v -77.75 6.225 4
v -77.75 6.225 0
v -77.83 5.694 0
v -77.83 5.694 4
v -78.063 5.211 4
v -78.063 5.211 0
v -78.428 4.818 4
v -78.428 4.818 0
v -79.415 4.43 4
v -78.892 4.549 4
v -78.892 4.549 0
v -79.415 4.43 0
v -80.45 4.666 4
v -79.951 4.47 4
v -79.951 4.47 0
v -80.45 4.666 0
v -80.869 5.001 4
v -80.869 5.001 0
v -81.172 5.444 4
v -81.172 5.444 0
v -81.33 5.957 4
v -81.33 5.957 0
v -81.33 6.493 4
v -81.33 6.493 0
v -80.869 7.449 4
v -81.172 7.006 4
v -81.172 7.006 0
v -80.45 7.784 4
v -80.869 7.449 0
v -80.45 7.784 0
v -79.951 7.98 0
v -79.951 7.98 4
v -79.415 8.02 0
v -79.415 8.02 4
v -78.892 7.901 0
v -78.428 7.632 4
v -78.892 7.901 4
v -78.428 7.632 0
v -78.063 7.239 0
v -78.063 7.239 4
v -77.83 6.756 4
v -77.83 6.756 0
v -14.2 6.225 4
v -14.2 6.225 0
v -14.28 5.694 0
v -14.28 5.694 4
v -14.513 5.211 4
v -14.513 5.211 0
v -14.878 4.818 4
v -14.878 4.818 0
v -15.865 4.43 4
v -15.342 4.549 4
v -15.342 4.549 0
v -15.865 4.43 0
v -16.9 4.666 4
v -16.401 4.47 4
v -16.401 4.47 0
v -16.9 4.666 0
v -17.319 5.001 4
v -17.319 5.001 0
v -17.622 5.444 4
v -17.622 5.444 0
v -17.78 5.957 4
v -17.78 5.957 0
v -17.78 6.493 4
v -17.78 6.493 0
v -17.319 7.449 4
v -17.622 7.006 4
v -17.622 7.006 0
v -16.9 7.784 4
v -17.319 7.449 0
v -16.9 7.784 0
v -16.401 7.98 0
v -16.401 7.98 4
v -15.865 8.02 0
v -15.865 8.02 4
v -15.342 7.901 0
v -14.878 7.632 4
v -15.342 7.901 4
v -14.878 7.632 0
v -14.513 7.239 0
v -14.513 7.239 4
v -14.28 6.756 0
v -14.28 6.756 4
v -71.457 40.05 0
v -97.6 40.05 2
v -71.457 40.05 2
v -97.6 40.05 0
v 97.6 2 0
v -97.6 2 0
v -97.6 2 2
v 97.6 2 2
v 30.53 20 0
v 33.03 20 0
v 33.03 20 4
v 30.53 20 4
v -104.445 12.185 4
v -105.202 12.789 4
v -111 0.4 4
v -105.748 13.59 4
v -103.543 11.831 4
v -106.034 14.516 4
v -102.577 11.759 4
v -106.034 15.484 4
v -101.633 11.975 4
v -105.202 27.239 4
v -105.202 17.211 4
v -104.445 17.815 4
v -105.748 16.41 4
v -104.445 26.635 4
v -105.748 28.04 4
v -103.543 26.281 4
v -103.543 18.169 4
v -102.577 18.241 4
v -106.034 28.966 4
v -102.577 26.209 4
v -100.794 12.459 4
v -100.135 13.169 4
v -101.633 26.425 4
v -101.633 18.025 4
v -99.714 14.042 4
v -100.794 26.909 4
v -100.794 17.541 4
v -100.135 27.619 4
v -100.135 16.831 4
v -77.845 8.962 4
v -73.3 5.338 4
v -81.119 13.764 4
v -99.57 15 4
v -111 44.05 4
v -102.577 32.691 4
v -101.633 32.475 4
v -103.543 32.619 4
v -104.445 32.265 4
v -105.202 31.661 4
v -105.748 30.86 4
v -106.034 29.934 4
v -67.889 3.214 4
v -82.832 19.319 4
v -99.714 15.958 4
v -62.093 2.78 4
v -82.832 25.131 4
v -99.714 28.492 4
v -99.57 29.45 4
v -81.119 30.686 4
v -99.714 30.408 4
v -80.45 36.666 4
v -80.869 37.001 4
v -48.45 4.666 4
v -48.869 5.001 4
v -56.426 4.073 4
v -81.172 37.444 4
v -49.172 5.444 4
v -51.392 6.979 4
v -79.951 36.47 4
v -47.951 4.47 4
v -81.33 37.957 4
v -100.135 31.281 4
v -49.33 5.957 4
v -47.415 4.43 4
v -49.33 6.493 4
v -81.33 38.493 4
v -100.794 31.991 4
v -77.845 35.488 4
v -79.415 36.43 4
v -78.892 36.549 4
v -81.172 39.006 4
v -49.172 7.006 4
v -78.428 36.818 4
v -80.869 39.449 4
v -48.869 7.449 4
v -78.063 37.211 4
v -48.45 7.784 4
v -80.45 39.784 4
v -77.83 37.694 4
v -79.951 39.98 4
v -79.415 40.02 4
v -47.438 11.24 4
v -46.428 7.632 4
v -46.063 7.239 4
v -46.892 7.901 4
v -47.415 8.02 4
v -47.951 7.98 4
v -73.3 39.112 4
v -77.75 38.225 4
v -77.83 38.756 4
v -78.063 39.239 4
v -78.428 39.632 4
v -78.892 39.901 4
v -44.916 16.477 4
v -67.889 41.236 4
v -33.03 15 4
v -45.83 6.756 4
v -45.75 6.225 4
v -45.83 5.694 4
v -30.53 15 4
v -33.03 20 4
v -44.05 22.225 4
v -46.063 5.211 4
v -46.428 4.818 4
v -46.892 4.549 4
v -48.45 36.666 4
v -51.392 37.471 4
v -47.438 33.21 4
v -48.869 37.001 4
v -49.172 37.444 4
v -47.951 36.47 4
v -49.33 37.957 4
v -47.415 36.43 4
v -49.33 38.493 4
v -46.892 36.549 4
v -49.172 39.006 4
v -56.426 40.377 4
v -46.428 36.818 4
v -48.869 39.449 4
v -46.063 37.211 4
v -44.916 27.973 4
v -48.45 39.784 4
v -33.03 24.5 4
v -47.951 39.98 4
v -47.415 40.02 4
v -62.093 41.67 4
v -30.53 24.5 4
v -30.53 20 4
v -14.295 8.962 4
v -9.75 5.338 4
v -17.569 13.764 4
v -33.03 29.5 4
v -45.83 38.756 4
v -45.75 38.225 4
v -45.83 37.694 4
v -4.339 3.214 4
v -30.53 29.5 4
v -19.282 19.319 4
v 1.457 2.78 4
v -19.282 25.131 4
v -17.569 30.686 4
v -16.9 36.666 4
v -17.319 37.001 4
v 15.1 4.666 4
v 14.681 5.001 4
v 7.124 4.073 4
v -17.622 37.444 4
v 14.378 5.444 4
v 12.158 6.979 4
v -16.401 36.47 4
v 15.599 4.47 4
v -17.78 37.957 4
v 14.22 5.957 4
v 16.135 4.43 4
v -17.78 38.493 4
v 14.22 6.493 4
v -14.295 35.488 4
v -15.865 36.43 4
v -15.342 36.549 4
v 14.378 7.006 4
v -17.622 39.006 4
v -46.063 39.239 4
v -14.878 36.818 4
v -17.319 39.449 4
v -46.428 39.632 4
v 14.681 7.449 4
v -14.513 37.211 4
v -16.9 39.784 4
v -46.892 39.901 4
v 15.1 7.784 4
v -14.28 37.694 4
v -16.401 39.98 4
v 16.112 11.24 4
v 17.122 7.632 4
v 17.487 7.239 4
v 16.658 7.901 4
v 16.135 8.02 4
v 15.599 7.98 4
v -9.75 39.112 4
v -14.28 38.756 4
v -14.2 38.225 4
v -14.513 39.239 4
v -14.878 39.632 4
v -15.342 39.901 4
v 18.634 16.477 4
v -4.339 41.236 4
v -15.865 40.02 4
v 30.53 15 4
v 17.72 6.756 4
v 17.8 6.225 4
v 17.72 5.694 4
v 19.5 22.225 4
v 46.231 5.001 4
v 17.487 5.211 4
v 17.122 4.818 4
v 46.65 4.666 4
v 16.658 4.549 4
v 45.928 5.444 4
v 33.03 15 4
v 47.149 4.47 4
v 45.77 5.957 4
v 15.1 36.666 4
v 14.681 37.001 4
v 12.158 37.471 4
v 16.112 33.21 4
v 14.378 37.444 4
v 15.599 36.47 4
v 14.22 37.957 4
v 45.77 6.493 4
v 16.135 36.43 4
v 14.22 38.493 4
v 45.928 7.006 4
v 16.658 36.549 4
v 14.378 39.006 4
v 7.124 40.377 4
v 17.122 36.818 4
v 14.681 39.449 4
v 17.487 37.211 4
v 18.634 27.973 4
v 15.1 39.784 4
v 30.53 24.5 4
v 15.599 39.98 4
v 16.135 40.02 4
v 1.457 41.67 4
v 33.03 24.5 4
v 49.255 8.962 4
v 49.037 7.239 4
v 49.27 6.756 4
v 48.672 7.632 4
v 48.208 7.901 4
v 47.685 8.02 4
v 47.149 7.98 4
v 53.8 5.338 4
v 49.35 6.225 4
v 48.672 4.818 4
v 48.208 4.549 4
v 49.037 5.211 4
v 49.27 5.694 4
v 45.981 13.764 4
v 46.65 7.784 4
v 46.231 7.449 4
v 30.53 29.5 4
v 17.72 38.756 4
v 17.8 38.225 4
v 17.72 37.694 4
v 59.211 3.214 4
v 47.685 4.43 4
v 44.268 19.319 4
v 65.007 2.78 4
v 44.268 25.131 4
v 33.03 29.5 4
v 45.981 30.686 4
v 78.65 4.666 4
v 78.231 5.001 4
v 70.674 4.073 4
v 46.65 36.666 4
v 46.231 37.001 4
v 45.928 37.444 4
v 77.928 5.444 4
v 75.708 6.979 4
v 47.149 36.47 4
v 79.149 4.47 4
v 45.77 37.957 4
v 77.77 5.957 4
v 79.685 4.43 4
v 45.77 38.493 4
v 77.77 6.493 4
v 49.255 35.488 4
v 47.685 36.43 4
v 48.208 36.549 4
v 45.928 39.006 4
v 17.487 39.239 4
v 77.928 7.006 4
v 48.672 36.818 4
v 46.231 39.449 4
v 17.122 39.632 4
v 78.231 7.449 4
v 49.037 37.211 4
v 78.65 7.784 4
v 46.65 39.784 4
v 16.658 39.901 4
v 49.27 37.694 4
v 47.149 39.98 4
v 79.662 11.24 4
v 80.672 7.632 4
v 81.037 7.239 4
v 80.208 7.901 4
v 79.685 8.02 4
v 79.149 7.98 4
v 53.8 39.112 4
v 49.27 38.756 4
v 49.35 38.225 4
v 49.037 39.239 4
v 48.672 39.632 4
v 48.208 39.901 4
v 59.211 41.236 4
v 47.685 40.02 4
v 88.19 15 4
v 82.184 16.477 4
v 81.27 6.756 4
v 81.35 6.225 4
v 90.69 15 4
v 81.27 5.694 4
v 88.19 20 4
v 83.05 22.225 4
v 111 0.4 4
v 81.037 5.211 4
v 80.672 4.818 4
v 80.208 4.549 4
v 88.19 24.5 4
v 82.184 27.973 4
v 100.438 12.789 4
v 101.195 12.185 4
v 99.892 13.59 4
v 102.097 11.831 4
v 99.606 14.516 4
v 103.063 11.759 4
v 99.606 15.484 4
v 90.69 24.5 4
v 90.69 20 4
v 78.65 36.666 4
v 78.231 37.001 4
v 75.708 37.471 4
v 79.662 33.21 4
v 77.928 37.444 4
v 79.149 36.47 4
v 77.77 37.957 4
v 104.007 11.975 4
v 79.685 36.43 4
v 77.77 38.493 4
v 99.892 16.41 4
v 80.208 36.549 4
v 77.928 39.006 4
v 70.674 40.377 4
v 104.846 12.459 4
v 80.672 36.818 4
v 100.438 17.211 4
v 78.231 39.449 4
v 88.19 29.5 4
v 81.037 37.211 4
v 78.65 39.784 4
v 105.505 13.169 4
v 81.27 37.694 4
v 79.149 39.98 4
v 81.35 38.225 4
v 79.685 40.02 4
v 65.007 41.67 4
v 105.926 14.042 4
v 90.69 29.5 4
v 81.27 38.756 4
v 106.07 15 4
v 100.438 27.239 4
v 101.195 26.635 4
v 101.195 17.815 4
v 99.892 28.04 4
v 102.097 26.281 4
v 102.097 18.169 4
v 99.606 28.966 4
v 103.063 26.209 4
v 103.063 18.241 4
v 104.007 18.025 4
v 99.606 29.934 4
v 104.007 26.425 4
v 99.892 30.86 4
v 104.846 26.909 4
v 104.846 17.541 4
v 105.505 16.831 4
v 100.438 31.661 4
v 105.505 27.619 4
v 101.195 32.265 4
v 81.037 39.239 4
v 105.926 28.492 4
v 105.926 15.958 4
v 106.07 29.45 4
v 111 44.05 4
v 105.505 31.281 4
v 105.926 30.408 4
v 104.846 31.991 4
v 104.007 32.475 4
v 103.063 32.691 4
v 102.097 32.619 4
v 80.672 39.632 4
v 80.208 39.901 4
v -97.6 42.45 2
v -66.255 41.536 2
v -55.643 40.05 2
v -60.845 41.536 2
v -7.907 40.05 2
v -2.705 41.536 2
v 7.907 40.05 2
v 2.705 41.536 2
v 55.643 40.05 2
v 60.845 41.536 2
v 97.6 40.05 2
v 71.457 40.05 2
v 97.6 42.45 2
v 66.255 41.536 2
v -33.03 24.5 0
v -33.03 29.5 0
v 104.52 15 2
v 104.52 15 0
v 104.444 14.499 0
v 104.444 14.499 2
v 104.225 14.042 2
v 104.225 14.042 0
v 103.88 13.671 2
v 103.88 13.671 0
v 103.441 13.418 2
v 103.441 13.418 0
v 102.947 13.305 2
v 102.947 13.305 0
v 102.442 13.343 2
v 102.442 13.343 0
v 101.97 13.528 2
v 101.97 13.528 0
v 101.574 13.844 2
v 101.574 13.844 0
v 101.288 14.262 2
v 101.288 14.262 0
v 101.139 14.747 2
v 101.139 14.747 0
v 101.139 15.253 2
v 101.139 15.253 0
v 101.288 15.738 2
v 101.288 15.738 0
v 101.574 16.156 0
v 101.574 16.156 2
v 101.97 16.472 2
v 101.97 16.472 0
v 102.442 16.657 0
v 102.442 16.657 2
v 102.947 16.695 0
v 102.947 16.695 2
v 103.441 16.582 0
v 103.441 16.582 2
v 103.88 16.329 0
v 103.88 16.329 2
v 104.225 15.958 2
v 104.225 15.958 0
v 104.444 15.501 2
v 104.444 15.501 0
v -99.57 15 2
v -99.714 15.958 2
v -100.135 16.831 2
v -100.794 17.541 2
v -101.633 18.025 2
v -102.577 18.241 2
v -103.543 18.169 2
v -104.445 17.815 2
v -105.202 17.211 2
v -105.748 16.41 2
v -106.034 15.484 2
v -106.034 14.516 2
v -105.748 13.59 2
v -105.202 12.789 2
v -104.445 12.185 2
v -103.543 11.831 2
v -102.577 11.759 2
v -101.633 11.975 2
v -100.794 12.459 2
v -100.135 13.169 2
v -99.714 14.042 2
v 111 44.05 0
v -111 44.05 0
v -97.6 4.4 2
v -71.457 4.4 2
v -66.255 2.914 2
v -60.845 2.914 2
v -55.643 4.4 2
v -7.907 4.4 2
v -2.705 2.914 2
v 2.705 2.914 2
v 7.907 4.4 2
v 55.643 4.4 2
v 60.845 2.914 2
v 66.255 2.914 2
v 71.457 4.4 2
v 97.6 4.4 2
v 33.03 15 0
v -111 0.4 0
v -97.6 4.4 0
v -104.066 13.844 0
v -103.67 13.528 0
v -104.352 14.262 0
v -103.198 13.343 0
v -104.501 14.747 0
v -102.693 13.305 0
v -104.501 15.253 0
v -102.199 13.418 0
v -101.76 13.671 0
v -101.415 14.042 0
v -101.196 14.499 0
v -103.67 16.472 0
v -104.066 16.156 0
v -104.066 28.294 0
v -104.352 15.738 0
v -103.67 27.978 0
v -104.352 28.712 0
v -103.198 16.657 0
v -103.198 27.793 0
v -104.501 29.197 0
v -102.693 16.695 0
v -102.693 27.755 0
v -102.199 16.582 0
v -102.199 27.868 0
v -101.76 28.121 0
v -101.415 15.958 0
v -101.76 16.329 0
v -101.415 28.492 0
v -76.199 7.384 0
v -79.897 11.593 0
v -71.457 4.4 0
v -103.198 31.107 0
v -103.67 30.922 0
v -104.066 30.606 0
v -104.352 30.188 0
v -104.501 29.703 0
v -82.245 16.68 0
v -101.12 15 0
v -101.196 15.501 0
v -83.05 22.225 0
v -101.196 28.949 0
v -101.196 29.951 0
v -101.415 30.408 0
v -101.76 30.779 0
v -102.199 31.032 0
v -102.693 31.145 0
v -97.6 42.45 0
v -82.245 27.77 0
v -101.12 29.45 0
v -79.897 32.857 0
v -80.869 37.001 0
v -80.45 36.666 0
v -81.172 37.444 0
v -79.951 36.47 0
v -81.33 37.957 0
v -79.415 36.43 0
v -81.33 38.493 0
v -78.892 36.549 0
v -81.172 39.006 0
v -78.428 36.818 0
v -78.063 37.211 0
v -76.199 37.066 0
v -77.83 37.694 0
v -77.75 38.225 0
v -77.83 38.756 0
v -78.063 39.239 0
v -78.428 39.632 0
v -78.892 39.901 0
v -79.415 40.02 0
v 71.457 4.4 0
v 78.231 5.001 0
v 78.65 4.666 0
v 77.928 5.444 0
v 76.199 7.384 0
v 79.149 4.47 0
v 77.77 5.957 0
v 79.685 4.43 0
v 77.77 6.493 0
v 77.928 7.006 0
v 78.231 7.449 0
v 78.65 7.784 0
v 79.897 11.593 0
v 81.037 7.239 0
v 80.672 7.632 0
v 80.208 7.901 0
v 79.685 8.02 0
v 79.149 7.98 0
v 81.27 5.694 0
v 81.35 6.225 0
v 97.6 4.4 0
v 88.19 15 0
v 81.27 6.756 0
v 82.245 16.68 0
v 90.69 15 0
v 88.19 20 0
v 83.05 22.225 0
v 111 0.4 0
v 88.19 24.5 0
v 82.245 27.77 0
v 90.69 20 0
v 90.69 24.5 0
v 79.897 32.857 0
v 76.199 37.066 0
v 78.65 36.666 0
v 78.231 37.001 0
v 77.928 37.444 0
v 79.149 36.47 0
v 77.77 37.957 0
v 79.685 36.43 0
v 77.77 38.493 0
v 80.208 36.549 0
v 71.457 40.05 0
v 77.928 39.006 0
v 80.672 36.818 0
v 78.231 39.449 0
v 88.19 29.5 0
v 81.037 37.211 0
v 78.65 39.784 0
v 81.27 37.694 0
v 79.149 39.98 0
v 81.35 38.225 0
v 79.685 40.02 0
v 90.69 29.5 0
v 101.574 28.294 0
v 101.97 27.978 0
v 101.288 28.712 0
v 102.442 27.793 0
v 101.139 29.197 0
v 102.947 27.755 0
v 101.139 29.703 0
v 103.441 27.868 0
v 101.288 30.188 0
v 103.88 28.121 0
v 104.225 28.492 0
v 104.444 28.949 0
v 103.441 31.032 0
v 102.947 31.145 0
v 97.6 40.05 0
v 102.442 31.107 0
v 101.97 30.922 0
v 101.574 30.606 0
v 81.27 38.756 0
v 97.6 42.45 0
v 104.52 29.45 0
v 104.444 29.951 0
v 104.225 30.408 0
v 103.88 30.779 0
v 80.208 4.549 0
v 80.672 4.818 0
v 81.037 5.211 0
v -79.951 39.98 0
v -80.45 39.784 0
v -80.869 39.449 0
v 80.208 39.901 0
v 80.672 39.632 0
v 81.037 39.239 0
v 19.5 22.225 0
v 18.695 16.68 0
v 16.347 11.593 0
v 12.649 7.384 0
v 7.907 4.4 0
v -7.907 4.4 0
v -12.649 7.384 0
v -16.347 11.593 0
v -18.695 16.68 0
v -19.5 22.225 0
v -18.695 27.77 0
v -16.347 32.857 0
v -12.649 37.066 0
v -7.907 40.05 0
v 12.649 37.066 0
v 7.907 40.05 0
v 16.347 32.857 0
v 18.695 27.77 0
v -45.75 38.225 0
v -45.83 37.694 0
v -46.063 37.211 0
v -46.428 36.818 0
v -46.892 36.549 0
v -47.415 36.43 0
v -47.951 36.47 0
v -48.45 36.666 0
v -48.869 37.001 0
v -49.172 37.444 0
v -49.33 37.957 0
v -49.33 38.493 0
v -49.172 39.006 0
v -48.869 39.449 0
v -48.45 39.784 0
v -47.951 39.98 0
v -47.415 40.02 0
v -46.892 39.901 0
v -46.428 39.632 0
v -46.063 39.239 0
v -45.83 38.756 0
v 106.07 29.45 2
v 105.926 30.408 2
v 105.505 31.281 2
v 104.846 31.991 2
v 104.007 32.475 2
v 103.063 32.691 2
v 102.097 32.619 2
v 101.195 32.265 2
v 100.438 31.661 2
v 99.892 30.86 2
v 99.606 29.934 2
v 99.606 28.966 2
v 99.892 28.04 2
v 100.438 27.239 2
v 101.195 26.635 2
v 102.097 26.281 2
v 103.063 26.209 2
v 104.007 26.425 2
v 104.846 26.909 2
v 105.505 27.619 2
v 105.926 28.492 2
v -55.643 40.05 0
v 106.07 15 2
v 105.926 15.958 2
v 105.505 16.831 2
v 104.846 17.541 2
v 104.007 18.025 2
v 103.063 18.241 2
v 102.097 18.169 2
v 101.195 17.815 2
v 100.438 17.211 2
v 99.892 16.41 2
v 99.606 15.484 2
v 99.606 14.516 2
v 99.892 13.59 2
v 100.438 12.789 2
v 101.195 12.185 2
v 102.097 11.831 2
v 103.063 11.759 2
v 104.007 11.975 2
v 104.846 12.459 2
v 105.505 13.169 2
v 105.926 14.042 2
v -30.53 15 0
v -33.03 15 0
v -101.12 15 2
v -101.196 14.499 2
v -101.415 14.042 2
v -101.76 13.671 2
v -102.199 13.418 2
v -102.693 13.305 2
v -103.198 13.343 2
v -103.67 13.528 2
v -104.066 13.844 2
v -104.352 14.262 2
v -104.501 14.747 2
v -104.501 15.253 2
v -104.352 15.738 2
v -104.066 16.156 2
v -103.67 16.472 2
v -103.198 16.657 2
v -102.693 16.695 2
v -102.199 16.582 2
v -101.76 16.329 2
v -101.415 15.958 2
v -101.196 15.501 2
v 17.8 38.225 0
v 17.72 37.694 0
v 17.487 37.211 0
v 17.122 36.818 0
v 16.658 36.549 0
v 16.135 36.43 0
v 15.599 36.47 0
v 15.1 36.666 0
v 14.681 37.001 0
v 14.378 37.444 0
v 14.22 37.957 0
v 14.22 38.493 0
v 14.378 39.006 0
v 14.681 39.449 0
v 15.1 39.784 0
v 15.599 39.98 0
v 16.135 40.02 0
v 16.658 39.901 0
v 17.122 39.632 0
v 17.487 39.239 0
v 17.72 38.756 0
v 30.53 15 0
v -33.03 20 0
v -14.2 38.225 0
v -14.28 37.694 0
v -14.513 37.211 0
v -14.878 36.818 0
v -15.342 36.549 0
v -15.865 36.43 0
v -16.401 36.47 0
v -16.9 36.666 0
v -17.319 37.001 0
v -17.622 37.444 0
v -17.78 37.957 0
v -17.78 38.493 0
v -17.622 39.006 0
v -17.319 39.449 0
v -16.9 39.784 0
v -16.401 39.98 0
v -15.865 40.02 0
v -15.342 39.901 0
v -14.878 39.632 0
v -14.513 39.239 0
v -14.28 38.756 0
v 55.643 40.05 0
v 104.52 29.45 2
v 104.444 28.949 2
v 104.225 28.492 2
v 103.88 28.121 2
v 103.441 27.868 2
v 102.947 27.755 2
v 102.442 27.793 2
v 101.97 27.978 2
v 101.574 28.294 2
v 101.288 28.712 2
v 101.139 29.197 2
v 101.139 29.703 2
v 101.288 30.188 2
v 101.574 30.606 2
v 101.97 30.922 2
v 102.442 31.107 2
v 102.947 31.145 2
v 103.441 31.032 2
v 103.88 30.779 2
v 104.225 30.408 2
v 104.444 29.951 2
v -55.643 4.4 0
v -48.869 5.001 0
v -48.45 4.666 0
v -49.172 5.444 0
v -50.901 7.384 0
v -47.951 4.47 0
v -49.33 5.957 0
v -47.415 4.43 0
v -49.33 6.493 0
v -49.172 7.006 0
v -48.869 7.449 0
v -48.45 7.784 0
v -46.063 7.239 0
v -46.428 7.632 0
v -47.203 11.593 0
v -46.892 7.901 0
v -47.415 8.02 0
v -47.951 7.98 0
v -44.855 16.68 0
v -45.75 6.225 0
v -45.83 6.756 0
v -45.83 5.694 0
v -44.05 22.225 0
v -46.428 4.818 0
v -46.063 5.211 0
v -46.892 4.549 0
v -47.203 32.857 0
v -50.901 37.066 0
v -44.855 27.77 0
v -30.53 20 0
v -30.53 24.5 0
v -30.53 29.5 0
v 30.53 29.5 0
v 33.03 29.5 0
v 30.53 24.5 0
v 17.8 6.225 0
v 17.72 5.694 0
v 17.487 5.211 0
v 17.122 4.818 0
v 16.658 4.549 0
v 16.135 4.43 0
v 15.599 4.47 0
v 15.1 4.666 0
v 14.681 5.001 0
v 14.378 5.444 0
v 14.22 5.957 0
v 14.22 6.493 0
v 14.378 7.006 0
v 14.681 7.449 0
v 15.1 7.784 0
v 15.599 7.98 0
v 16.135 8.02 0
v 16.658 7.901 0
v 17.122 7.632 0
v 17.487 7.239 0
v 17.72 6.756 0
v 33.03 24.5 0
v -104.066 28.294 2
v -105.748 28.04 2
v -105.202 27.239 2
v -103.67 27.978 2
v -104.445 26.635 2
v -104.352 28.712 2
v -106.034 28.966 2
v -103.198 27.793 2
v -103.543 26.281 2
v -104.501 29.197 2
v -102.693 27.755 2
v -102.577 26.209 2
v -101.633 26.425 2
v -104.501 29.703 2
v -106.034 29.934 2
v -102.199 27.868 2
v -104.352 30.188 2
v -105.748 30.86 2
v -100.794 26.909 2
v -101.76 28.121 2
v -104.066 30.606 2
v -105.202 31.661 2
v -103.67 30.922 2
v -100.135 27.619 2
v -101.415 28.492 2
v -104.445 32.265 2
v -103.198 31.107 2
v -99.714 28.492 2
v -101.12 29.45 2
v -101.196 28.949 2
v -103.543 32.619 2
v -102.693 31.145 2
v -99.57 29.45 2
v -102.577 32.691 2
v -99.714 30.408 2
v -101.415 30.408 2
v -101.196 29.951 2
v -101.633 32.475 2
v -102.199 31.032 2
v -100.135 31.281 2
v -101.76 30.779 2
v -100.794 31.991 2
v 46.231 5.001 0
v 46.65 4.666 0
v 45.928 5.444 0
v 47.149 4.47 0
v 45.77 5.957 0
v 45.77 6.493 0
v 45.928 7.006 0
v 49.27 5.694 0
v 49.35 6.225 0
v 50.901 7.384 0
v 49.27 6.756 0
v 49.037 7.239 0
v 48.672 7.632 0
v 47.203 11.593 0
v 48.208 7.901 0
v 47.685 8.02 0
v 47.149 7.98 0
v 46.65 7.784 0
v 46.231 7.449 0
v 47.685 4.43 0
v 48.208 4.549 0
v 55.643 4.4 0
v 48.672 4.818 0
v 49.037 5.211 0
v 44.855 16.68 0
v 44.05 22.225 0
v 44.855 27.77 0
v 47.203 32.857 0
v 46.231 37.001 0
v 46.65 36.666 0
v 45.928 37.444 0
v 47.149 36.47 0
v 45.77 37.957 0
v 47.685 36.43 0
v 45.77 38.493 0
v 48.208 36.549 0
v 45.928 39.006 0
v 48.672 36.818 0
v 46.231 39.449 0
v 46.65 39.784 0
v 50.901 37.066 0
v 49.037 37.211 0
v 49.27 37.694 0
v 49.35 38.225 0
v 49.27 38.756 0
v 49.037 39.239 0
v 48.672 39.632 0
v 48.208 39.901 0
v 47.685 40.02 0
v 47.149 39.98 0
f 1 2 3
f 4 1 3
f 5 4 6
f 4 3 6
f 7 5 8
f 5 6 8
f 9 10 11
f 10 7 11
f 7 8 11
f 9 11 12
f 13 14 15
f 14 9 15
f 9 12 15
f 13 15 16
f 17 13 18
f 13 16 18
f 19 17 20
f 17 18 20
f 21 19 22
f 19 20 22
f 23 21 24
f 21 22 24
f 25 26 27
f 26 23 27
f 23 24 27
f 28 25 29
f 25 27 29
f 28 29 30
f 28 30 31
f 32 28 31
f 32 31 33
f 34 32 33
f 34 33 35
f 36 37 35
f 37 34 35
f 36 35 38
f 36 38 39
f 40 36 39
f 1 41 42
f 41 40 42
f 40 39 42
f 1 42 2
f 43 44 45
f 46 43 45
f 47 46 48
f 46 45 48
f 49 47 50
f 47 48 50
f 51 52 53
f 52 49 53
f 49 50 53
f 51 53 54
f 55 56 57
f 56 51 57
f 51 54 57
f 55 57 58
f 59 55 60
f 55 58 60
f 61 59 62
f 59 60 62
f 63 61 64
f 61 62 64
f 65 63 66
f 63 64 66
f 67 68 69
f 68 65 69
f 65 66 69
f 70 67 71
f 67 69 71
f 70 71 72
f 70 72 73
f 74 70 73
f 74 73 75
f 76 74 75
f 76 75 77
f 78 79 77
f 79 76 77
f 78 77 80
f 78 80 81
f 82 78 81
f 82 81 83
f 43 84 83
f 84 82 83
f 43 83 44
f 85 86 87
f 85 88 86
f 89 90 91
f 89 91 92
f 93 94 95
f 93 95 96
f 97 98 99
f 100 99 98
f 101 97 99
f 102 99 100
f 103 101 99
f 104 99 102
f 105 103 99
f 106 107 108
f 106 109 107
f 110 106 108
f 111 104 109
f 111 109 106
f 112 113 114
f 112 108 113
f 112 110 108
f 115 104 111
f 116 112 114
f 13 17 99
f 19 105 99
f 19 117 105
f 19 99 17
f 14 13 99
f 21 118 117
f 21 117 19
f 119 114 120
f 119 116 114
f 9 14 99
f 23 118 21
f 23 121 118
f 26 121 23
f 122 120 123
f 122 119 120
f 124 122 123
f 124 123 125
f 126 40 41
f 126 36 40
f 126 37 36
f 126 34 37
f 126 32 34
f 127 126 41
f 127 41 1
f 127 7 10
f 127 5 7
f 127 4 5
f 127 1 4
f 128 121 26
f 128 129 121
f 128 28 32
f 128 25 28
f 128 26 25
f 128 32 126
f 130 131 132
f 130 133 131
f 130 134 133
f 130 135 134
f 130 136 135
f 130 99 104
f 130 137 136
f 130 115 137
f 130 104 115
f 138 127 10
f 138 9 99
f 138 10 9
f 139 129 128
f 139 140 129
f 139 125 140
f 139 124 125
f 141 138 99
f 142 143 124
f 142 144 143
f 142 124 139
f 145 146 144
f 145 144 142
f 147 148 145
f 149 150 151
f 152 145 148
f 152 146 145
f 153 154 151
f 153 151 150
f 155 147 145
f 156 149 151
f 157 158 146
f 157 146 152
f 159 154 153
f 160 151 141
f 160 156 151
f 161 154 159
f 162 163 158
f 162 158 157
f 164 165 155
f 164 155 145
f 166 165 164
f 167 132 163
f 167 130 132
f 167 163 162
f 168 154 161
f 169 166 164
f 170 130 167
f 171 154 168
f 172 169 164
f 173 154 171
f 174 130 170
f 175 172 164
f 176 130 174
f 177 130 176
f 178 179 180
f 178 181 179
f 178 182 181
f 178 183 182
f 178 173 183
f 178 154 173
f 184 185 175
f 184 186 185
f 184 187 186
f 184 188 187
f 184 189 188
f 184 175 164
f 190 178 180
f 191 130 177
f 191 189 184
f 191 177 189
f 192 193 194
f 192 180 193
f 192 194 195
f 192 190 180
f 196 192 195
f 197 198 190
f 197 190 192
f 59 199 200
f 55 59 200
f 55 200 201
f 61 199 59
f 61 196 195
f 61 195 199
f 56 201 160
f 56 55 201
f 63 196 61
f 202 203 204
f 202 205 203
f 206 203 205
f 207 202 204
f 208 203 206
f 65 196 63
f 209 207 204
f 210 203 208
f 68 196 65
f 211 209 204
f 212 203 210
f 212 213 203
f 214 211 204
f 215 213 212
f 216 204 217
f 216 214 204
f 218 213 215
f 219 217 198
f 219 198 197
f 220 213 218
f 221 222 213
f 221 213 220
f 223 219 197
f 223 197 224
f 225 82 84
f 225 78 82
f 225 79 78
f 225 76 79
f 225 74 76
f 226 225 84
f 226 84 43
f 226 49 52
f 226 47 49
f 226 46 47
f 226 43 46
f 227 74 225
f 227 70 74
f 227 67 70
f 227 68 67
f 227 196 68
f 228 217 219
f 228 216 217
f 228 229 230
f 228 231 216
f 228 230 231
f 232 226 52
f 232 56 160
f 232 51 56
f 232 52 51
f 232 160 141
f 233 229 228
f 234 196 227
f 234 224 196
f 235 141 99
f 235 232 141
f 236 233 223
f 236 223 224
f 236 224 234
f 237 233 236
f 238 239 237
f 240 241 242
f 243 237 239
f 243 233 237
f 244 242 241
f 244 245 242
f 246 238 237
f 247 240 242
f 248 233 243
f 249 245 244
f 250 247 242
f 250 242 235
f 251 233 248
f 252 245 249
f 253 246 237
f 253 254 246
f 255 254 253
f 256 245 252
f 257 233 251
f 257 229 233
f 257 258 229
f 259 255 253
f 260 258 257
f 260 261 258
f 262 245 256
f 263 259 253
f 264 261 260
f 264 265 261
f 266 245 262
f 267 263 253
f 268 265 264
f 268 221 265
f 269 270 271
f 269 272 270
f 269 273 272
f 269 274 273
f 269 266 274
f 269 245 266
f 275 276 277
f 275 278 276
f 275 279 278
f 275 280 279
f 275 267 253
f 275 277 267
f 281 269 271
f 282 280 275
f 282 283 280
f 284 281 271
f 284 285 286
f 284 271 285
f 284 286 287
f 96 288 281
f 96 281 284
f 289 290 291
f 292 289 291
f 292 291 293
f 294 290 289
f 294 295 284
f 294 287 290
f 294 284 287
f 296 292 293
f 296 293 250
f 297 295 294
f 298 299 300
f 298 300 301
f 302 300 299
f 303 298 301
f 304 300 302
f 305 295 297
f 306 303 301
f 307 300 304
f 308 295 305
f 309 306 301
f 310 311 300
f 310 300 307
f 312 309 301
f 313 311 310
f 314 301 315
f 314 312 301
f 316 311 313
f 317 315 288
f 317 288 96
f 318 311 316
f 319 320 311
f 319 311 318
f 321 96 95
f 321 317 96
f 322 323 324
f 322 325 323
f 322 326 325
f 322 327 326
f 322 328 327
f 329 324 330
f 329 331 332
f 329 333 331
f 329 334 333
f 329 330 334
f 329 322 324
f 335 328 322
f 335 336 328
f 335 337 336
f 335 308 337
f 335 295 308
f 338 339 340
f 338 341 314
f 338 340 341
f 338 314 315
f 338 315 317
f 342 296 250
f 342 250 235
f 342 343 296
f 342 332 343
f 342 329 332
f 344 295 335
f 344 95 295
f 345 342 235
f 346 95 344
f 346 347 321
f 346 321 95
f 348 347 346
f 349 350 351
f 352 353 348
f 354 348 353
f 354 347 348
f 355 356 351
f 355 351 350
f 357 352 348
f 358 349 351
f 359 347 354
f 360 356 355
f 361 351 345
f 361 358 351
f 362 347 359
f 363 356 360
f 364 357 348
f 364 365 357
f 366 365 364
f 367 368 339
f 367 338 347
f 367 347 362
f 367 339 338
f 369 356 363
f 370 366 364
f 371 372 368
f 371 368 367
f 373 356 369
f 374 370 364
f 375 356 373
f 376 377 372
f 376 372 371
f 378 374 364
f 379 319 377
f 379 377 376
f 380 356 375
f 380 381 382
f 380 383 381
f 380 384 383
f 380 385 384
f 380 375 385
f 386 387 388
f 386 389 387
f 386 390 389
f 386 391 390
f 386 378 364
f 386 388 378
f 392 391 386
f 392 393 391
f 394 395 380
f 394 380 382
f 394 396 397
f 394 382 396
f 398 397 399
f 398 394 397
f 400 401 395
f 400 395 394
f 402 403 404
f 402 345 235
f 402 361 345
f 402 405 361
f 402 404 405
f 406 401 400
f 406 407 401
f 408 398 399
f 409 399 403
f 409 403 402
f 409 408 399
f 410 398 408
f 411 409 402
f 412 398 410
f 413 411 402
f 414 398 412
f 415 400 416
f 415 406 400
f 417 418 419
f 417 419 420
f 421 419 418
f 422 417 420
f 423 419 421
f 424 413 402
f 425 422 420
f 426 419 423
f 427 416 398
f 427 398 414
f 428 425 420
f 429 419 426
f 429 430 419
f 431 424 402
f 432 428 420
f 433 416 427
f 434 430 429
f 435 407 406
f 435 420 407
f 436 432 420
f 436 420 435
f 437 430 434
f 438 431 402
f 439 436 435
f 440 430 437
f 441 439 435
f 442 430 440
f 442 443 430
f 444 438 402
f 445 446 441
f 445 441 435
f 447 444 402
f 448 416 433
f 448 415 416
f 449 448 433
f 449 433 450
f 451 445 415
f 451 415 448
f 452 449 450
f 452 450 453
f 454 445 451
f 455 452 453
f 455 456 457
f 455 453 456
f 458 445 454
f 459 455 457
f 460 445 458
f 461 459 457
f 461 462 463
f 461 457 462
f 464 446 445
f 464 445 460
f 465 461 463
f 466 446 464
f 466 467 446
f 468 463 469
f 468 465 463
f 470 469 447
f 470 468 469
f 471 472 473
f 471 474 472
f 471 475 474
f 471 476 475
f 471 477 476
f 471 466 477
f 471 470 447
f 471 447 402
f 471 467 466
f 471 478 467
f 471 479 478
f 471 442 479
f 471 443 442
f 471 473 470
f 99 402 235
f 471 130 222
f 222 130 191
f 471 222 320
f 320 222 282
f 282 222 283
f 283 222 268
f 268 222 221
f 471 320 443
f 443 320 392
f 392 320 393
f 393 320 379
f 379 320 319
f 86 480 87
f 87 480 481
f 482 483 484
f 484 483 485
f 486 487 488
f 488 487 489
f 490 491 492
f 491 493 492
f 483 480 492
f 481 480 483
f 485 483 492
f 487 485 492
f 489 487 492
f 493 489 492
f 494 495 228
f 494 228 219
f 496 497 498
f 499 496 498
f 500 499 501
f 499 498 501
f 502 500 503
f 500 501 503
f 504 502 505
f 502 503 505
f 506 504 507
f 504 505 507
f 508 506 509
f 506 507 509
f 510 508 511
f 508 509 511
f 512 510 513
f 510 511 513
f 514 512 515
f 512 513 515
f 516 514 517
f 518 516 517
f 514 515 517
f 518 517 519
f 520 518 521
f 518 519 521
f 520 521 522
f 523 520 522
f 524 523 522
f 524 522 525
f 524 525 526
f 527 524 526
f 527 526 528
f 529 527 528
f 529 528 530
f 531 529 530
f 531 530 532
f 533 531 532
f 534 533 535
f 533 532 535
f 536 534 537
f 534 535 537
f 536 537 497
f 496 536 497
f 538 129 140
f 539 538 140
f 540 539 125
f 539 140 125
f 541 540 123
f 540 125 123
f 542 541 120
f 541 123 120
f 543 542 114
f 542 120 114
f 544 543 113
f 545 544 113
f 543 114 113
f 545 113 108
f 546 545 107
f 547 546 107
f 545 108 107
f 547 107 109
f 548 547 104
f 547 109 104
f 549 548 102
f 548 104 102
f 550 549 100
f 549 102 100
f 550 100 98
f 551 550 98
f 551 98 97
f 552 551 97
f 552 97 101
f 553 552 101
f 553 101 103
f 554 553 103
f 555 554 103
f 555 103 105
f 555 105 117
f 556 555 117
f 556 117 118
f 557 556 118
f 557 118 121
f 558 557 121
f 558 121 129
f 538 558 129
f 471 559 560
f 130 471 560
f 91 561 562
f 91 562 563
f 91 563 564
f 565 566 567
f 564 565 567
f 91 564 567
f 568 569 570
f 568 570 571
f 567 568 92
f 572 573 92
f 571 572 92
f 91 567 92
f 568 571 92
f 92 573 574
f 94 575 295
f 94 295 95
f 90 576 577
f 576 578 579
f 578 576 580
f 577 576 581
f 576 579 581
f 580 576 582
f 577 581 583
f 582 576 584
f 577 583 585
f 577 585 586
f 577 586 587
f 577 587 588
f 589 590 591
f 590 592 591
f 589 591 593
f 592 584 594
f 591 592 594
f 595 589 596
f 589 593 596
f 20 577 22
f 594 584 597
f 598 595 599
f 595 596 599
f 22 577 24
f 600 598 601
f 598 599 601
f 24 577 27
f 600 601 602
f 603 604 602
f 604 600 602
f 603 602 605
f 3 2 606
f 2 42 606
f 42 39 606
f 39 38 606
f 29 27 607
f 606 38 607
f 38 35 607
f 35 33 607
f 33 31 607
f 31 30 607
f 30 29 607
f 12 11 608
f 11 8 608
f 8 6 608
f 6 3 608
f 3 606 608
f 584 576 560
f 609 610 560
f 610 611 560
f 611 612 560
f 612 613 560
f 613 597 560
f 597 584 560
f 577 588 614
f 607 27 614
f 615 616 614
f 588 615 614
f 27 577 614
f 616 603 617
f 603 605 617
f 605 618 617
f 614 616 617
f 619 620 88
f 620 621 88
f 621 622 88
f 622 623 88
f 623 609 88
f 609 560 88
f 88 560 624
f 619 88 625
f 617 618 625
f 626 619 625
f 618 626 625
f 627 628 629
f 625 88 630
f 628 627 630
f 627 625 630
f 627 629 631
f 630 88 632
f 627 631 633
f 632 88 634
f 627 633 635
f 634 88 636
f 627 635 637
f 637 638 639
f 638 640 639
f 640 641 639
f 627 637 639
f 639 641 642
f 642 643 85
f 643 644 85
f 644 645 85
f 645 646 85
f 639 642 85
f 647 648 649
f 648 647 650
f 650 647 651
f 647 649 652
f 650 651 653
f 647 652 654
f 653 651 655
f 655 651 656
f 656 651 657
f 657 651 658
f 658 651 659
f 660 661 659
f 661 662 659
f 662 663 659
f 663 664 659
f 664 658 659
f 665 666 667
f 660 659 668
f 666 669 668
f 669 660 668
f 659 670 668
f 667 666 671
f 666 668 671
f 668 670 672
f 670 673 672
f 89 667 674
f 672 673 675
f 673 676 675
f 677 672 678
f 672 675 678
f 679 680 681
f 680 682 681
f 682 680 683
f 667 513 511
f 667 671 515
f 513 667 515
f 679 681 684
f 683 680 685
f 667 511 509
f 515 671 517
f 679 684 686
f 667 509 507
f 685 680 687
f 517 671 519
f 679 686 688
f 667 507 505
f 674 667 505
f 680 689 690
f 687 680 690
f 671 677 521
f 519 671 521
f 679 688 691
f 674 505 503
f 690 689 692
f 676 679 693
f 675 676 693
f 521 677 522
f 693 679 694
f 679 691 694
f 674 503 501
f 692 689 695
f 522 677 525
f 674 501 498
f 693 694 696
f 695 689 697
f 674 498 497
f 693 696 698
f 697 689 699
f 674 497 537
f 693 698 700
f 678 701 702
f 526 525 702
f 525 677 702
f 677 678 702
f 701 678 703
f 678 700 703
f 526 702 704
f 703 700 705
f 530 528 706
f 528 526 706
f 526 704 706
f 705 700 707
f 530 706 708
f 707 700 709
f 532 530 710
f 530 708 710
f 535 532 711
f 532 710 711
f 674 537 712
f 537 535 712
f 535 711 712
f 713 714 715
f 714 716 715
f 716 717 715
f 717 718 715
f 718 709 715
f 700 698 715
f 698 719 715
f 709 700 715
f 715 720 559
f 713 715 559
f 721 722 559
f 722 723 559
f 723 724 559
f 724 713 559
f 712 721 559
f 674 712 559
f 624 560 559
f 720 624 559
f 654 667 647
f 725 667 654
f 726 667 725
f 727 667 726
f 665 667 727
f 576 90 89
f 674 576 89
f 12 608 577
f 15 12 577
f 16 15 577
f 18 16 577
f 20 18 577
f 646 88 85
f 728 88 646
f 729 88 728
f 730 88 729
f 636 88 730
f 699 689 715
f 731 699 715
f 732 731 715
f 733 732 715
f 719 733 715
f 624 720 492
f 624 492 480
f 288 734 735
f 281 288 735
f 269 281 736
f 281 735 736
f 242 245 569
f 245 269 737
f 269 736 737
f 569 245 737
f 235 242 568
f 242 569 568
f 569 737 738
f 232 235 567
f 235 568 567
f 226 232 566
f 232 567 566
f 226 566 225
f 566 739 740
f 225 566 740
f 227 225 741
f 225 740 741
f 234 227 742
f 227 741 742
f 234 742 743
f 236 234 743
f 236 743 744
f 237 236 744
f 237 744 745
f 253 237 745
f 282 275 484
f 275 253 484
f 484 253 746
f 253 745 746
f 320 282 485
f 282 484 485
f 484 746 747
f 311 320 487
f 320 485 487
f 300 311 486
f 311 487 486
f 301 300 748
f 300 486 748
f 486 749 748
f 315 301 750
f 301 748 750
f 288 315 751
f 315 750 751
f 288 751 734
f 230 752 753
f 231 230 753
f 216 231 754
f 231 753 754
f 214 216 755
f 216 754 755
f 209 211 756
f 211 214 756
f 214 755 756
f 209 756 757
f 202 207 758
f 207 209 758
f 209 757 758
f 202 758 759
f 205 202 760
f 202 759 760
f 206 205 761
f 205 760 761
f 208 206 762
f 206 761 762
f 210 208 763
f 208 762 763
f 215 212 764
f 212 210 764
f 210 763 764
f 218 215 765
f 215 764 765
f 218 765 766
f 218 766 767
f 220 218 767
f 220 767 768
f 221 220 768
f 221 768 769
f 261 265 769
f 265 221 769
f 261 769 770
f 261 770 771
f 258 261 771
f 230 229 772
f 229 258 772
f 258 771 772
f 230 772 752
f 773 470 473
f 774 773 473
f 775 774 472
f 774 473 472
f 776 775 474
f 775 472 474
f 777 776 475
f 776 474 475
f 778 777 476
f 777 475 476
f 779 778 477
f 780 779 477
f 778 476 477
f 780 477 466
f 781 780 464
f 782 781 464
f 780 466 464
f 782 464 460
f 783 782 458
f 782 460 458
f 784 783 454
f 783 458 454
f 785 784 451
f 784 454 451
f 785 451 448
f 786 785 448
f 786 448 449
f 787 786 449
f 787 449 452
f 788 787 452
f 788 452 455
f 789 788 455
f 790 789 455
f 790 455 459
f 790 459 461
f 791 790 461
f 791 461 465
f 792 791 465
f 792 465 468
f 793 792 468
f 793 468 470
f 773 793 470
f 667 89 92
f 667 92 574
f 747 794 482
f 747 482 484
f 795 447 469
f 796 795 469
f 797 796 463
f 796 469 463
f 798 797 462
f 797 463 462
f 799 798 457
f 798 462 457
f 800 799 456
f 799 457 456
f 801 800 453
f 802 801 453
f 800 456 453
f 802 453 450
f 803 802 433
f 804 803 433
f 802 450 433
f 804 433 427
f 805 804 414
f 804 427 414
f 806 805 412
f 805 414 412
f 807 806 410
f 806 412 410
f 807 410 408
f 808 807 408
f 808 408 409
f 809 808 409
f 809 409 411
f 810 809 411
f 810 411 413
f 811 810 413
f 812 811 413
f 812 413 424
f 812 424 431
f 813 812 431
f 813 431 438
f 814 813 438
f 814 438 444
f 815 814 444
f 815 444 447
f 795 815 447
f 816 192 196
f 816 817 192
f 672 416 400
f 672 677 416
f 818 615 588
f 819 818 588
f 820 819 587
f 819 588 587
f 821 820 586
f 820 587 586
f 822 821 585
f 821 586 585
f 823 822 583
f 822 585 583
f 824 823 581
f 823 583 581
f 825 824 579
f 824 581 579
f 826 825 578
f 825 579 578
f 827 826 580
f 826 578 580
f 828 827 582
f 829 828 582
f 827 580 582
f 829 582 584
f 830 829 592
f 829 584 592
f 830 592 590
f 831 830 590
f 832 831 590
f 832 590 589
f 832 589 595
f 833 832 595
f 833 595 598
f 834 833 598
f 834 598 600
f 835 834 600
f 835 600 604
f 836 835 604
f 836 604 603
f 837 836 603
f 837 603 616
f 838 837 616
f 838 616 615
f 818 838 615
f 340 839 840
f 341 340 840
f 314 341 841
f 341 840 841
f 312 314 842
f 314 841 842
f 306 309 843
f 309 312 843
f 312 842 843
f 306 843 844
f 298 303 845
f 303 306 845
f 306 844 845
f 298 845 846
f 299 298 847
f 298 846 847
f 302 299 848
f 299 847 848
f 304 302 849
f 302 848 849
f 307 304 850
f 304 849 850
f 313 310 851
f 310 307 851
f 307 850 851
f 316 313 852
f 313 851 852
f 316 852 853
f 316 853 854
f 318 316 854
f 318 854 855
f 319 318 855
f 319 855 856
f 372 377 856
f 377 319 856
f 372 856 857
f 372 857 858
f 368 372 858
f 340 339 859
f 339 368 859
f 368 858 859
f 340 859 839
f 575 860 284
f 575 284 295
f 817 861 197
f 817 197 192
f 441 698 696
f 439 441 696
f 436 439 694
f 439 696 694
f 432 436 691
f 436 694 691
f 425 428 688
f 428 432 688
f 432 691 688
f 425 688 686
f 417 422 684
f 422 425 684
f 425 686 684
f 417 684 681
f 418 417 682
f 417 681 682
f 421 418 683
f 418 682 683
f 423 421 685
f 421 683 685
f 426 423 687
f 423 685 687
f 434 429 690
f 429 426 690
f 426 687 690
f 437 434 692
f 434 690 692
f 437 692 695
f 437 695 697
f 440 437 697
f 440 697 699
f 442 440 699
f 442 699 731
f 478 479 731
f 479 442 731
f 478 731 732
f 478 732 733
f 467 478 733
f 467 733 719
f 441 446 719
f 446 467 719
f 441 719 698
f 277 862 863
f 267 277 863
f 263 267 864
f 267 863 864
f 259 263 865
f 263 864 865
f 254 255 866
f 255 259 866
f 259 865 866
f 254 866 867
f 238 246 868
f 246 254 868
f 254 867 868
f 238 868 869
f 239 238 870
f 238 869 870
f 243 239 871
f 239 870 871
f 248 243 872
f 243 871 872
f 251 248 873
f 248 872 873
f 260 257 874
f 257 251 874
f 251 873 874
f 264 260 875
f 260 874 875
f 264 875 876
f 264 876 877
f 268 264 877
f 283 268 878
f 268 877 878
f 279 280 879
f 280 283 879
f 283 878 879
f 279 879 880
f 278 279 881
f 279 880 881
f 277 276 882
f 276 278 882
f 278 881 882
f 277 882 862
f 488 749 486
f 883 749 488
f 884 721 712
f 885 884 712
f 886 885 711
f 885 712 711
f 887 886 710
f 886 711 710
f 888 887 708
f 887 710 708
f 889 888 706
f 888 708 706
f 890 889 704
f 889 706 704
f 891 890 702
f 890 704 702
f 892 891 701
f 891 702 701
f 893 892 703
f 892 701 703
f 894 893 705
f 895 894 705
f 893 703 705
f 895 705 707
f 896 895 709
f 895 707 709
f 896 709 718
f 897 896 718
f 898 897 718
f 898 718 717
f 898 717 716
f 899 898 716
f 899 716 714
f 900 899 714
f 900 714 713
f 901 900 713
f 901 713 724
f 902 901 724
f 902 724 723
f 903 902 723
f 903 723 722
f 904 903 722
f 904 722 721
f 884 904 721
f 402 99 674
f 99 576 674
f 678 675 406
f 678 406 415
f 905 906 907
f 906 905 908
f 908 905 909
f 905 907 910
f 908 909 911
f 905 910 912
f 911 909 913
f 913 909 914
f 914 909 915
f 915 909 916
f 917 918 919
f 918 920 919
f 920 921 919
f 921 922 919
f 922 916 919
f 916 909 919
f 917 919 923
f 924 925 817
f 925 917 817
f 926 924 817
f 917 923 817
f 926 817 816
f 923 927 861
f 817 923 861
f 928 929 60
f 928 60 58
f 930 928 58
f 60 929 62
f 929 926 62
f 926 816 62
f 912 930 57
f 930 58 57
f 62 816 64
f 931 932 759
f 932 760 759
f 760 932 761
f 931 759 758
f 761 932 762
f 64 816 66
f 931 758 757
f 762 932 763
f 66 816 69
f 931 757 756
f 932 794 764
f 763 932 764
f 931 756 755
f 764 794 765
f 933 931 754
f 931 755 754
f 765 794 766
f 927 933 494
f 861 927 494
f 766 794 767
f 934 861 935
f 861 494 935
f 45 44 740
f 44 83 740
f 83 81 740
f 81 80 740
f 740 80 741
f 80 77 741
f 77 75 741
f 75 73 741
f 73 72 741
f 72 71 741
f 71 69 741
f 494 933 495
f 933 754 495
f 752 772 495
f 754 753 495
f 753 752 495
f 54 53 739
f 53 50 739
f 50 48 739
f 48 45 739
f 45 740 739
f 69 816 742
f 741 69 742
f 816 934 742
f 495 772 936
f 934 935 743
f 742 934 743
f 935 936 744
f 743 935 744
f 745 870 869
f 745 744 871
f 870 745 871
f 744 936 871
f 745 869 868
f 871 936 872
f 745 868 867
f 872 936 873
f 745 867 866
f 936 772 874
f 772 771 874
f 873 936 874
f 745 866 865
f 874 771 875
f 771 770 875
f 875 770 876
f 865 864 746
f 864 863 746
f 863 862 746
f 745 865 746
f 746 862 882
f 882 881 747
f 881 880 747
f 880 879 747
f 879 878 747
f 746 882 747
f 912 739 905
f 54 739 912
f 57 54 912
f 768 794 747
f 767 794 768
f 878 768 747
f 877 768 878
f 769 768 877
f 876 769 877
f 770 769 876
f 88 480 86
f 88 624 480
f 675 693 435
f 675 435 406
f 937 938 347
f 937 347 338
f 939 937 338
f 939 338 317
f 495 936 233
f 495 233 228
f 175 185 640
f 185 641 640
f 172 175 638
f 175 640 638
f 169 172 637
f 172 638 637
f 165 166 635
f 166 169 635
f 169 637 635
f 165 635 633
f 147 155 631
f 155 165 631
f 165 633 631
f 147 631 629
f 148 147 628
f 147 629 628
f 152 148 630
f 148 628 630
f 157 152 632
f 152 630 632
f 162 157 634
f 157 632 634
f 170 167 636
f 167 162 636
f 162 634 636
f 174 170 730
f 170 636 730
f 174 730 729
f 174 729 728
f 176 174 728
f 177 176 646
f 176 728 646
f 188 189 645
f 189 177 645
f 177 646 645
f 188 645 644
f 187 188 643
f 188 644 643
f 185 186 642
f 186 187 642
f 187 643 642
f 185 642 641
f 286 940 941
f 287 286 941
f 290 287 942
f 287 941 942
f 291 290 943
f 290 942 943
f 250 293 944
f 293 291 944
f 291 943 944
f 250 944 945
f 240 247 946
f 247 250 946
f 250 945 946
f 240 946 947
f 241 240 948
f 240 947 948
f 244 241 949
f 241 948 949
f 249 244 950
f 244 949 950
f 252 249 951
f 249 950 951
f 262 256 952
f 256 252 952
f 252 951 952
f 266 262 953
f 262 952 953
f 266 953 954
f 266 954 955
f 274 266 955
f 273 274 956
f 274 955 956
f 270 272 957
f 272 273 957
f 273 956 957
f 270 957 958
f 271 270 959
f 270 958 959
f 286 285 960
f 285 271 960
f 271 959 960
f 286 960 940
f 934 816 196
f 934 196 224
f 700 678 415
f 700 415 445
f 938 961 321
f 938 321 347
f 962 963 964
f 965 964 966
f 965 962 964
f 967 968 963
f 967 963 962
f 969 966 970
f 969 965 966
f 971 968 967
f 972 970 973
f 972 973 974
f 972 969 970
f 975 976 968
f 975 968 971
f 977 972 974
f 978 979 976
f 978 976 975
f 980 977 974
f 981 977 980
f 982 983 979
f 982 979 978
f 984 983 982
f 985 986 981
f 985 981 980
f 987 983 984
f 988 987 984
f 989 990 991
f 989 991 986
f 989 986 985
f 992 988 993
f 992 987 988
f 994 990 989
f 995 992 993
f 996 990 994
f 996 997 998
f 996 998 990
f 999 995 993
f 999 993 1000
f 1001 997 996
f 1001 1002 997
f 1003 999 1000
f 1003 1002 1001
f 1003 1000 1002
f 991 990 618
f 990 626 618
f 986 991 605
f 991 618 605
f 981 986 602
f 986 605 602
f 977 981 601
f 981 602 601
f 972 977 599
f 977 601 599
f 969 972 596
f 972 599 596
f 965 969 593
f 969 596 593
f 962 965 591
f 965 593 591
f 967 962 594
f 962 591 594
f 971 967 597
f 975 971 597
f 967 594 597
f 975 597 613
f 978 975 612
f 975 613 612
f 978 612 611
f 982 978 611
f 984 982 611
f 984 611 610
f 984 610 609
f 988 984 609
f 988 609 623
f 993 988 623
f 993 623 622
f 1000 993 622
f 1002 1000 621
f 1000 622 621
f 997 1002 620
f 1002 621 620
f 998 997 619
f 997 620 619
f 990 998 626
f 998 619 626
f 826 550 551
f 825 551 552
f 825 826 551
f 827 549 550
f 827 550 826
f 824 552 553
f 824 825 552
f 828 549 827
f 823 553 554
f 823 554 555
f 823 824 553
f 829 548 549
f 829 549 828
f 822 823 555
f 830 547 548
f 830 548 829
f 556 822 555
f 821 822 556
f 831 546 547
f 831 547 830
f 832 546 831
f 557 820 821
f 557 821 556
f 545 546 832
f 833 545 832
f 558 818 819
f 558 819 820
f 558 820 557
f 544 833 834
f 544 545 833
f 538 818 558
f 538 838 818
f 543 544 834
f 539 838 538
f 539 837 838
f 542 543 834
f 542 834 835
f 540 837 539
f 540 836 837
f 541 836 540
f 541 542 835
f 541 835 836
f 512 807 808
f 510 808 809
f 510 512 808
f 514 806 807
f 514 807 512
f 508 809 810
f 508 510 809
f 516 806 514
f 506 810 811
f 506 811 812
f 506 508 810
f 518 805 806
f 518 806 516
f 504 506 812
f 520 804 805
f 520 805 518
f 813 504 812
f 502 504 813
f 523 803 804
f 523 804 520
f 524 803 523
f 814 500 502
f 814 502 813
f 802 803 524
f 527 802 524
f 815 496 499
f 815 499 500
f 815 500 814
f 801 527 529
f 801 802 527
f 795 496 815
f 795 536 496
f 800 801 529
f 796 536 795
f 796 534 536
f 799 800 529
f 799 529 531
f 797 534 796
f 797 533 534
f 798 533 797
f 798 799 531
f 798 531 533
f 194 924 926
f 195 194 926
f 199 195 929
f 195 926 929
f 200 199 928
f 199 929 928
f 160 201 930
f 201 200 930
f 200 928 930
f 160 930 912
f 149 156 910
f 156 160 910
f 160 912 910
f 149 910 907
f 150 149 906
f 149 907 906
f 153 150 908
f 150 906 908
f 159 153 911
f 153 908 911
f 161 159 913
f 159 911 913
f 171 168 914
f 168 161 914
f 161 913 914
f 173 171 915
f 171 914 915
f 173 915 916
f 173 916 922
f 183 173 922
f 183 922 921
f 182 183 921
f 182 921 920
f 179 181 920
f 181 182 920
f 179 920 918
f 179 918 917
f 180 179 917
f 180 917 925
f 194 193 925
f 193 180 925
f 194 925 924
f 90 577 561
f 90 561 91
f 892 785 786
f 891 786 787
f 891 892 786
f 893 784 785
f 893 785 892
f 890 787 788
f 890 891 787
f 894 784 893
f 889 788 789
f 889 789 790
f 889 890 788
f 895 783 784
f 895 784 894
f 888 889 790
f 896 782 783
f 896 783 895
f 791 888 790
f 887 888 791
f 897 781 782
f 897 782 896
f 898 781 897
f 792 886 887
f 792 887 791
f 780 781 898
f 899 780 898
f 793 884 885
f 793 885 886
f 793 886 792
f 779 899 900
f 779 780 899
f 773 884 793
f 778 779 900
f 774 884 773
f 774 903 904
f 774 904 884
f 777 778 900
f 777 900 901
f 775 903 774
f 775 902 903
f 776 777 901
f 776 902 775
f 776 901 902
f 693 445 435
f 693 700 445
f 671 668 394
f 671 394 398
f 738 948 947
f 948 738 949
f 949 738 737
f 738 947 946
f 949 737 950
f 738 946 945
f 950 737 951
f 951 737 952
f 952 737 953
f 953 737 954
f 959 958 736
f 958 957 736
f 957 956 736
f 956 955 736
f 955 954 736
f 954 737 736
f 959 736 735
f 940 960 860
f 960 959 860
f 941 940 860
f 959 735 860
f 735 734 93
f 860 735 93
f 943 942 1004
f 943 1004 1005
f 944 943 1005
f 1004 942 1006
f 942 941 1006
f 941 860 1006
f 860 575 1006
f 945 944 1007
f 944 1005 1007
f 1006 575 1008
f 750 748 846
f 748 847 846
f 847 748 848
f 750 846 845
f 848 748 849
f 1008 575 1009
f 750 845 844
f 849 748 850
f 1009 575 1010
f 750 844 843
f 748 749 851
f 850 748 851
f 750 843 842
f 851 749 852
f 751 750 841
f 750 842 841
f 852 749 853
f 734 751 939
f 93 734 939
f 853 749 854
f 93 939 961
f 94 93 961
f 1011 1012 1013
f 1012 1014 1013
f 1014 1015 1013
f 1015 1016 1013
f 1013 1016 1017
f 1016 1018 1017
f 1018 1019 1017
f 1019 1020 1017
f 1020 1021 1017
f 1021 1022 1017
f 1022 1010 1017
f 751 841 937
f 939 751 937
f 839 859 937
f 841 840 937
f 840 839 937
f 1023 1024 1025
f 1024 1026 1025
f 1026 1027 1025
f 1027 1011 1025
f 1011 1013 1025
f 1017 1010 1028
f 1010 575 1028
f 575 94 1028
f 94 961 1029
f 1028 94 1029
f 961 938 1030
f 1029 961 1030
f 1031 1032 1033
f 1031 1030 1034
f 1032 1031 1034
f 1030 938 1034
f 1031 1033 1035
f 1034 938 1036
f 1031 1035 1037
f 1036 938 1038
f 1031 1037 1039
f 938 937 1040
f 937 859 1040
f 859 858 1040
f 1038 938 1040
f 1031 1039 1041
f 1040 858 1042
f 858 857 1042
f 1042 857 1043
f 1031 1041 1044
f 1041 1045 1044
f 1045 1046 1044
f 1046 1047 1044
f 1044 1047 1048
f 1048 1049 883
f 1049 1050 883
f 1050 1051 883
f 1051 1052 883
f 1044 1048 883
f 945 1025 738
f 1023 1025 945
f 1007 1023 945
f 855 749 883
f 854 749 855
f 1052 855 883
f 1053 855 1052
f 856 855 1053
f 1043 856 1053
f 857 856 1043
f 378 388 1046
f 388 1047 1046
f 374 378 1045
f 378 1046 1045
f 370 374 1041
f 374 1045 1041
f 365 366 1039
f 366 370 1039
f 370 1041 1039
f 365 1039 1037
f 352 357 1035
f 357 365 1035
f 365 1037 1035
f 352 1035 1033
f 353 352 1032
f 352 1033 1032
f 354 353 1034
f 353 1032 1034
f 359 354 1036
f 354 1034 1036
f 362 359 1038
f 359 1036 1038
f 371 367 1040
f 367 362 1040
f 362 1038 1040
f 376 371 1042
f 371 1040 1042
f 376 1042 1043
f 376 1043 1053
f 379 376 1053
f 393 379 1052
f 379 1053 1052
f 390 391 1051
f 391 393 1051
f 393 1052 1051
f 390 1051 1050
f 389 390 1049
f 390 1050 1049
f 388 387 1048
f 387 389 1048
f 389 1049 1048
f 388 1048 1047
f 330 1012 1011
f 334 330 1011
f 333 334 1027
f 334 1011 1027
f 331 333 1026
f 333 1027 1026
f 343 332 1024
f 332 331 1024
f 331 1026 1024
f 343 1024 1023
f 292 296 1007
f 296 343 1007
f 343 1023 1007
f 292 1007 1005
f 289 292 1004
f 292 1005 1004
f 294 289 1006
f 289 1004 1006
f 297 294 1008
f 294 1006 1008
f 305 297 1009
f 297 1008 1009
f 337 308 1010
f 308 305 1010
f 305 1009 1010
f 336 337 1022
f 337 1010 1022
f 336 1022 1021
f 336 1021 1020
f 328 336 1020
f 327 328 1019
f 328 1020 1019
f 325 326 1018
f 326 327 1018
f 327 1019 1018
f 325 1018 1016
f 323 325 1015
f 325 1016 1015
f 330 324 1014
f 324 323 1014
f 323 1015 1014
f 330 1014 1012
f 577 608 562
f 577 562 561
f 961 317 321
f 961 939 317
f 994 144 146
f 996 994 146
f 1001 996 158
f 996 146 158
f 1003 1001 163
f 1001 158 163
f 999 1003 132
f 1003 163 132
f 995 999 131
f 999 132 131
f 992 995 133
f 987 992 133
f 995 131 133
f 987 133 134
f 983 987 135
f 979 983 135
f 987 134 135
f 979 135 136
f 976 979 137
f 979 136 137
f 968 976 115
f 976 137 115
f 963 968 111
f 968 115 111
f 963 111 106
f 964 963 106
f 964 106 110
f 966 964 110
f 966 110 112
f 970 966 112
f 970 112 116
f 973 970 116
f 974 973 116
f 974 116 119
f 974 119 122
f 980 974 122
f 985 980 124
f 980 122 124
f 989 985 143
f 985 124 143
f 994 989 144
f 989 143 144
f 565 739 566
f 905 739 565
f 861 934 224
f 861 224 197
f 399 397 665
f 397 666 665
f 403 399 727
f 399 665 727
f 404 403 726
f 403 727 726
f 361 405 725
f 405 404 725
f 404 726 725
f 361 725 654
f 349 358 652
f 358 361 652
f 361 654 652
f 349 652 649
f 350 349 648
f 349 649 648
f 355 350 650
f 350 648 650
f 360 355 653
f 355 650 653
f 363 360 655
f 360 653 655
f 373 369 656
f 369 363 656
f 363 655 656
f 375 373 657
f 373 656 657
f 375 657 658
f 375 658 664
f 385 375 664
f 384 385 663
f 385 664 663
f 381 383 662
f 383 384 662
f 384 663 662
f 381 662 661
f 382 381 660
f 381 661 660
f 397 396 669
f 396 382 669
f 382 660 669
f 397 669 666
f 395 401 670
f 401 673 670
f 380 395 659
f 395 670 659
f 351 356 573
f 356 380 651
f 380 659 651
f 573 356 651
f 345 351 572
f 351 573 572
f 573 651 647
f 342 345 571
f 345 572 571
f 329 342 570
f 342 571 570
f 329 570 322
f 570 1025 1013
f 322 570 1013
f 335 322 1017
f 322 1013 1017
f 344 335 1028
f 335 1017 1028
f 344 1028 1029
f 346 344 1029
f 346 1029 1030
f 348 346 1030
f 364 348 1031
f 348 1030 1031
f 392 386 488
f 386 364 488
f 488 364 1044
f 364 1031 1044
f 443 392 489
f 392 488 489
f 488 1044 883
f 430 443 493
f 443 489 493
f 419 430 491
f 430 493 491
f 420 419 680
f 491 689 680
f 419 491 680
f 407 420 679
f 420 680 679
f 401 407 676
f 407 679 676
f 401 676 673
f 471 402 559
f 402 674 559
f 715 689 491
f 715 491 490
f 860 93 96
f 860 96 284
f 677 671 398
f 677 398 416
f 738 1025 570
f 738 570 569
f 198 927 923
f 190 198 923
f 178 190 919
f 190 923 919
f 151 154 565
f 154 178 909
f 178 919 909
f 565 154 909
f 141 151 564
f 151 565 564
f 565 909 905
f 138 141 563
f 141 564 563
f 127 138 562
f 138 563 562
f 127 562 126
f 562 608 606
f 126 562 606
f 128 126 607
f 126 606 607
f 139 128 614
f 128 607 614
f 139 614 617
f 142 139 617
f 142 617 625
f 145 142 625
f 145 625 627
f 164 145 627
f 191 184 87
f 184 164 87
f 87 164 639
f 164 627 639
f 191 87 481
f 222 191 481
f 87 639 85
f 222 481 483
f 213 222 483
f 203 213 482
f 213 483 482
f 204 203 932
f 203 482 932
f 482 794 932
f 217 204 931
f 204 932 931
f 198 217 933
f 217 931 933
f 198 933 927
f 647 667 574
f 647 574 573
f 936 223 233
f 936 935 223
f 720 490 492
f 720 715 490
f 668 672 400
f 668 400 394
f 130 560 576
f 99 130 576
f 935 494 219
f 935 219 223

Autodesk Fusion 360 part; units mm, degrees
sketch "Sketch1" plane through (0, 0, 0) normal (0, 0, 1) x (1, 0, 0)
  line L0 (-111, 0.4) -> (111, 0.4)
  line L1 (111, 0.4) -> (111, 44.05)
  line L2 (111, 44.05) -> (-111, 44.05)
  line L3 (-111, 44.05) -> (-111, 0.4)
extrude "Extrude1" add sketch "Sketch1" along normal blind 4
sketch "Sketch2" plane through (0, 0, 0) normal (0, 0, 1) x (1, 0, 0)
  circle A0 centre (-63.55, 22.225) radius 19.5
  circle A1 centre (-79.55, 6.225) radius 1.8
  circle A2 centre (-79.55, 38.225) radius 1.8
  circle A3 centre (-47.55, 6.225) radius 1.8
  circle A4 centre (-47.55, 38.225) radius 1.8
  circle A5 centre (0, 22.225) radius 19.5
  circle A6 centre (-16, 6.225) radius 1.8
  circle A7 centre (-16, 38.225) radius 1.8
  circle A8 centre (16, 6.225) radius 1.8
  circle A9 centre (16, 38.225) radius 1.8
  circle A10 centre (63.55, 22.225) radius 19.5
  circle A11 centre (47.55, 6.225) radius 1.8
  circle A12 centre (47.55, 38.225) radius 1.8
  circle A13 centre (79.55, 6.225) radius 1.8
  circle A14 centre (79.55, 38.225) radius 1.8
  circle A15 centre (-102.82, 15) radius 1.7
  circle A16 centre (-102.82, 29.45) radius 1.7
  circle A17 centre (102.82, 15) radius 1.7
  circle A18 centre (102.82, 29.45) radius 1.7
extrude "Extrude2" cut sketch "Sketch2" along normal blind 4
sketch "Sketch3" plane through (0, 0, 0) normal (0, 0, 1) x (1, 0, 0)
  line L0 (-33.03, 15) -> (-30.53, 15)
  line L1 (-30.53, 15) -> (-30.53, 20)
  line L2 (-30.53, 20) -> (-33.03, 20)
  line L3 (-33.03, 20) -> (-33.03, 15)
  line L4 (-33.03, 24.5) -> (-30.53, 24.5)
  line L5 (-30.53, 24.5) -> (-30.53, 29.5)
  line L6 (-30.53, 29.5) -> (-33.03, 29.5)
  line L7 (-33.03, 29.5) -> (-33.03, 24.5)
  line L8 (30.53, 15) -> (33.03, 15)
  line L9 (33.03, 15) -> (33.03, 20)
  line L10 (33.03, 20) -> (30.53, 20)
  line L11 (30.53, 20) -> (30.53, 15)
  line L12 (30.53, 24.5) -> (33.03, 24.5)
  line L13 (33.03, 24.5) -> (33.03, 29.5)
  line L14 (33.03, 29.5) -> (30.53, 29.5)
  line L15 (30.53, 29.5) -> (30.53, 24.5)
  line L16 (88.19, 15) -> (90.69, 15)
  line L17 (90.69, 15) -> (90.69, 20)
  line L18 (90.69, 20) -> (88.19, 20)
  line L19 (88.19, 20) -> (88.19, 15)
  line L20 (88.19, 24.5) -> (90.69, 24.5)
  line L21 (90.69, 24.5) -> (90.69, 29.5)
  line L22 (90.69, 29.5) -> (88.19, 29.5)
  line L23 (88.19, 29.5) -> (88.19, 24.5)
extrude "Extrude3" cut sketch "Sketch3" along normal blind 4
ref_plane "WorkPlane1" through (0, 0, 4) normal (0, 0, 1) x (1, 0, 0)
sketch "Sketch4" plane through (0, 0, 4) normal (0, 0, 1) x (1, 0, 0)
  circle A0 centre (-102.82, 15) radius 3.25
  circle A1 centre (-102.82, 29.45) radius 3.25
  circle A2 centre (102.82, 15) radius 3.25
  circle A3 centre (102.82, 29.45) radius 3.25
extrude "Extrude4" cut sketch "Sketch4" against normal blind 2
sketch "Sketch5" plane through (0, 0, 0) normal (0, 0, 1) x (1, 0, 0)
  line L0 (-97.6, 2) -> (97.6, 2)
  line L1 (97.6, 2) -> (97.6, 4.4)
  line L2 (97.6, 4.4) -> (-97.6, 4.4)
  line L3 (-97.6, 4.4) -> (-97.6, 2)
  line L4 (-97.6, 40.05) -> (97.6, 40.05)
  line L5 (97.6, 40.05) -> (97.6, 42.45)
  line L6 (97.6, 42.45) -> (-97.6, 42.45)
  line L7 (-97.6, 42.45) -> (-97.6, 40.05)
extrude "Extrude5" cut sketch "Sketch5" along normal blind 2
